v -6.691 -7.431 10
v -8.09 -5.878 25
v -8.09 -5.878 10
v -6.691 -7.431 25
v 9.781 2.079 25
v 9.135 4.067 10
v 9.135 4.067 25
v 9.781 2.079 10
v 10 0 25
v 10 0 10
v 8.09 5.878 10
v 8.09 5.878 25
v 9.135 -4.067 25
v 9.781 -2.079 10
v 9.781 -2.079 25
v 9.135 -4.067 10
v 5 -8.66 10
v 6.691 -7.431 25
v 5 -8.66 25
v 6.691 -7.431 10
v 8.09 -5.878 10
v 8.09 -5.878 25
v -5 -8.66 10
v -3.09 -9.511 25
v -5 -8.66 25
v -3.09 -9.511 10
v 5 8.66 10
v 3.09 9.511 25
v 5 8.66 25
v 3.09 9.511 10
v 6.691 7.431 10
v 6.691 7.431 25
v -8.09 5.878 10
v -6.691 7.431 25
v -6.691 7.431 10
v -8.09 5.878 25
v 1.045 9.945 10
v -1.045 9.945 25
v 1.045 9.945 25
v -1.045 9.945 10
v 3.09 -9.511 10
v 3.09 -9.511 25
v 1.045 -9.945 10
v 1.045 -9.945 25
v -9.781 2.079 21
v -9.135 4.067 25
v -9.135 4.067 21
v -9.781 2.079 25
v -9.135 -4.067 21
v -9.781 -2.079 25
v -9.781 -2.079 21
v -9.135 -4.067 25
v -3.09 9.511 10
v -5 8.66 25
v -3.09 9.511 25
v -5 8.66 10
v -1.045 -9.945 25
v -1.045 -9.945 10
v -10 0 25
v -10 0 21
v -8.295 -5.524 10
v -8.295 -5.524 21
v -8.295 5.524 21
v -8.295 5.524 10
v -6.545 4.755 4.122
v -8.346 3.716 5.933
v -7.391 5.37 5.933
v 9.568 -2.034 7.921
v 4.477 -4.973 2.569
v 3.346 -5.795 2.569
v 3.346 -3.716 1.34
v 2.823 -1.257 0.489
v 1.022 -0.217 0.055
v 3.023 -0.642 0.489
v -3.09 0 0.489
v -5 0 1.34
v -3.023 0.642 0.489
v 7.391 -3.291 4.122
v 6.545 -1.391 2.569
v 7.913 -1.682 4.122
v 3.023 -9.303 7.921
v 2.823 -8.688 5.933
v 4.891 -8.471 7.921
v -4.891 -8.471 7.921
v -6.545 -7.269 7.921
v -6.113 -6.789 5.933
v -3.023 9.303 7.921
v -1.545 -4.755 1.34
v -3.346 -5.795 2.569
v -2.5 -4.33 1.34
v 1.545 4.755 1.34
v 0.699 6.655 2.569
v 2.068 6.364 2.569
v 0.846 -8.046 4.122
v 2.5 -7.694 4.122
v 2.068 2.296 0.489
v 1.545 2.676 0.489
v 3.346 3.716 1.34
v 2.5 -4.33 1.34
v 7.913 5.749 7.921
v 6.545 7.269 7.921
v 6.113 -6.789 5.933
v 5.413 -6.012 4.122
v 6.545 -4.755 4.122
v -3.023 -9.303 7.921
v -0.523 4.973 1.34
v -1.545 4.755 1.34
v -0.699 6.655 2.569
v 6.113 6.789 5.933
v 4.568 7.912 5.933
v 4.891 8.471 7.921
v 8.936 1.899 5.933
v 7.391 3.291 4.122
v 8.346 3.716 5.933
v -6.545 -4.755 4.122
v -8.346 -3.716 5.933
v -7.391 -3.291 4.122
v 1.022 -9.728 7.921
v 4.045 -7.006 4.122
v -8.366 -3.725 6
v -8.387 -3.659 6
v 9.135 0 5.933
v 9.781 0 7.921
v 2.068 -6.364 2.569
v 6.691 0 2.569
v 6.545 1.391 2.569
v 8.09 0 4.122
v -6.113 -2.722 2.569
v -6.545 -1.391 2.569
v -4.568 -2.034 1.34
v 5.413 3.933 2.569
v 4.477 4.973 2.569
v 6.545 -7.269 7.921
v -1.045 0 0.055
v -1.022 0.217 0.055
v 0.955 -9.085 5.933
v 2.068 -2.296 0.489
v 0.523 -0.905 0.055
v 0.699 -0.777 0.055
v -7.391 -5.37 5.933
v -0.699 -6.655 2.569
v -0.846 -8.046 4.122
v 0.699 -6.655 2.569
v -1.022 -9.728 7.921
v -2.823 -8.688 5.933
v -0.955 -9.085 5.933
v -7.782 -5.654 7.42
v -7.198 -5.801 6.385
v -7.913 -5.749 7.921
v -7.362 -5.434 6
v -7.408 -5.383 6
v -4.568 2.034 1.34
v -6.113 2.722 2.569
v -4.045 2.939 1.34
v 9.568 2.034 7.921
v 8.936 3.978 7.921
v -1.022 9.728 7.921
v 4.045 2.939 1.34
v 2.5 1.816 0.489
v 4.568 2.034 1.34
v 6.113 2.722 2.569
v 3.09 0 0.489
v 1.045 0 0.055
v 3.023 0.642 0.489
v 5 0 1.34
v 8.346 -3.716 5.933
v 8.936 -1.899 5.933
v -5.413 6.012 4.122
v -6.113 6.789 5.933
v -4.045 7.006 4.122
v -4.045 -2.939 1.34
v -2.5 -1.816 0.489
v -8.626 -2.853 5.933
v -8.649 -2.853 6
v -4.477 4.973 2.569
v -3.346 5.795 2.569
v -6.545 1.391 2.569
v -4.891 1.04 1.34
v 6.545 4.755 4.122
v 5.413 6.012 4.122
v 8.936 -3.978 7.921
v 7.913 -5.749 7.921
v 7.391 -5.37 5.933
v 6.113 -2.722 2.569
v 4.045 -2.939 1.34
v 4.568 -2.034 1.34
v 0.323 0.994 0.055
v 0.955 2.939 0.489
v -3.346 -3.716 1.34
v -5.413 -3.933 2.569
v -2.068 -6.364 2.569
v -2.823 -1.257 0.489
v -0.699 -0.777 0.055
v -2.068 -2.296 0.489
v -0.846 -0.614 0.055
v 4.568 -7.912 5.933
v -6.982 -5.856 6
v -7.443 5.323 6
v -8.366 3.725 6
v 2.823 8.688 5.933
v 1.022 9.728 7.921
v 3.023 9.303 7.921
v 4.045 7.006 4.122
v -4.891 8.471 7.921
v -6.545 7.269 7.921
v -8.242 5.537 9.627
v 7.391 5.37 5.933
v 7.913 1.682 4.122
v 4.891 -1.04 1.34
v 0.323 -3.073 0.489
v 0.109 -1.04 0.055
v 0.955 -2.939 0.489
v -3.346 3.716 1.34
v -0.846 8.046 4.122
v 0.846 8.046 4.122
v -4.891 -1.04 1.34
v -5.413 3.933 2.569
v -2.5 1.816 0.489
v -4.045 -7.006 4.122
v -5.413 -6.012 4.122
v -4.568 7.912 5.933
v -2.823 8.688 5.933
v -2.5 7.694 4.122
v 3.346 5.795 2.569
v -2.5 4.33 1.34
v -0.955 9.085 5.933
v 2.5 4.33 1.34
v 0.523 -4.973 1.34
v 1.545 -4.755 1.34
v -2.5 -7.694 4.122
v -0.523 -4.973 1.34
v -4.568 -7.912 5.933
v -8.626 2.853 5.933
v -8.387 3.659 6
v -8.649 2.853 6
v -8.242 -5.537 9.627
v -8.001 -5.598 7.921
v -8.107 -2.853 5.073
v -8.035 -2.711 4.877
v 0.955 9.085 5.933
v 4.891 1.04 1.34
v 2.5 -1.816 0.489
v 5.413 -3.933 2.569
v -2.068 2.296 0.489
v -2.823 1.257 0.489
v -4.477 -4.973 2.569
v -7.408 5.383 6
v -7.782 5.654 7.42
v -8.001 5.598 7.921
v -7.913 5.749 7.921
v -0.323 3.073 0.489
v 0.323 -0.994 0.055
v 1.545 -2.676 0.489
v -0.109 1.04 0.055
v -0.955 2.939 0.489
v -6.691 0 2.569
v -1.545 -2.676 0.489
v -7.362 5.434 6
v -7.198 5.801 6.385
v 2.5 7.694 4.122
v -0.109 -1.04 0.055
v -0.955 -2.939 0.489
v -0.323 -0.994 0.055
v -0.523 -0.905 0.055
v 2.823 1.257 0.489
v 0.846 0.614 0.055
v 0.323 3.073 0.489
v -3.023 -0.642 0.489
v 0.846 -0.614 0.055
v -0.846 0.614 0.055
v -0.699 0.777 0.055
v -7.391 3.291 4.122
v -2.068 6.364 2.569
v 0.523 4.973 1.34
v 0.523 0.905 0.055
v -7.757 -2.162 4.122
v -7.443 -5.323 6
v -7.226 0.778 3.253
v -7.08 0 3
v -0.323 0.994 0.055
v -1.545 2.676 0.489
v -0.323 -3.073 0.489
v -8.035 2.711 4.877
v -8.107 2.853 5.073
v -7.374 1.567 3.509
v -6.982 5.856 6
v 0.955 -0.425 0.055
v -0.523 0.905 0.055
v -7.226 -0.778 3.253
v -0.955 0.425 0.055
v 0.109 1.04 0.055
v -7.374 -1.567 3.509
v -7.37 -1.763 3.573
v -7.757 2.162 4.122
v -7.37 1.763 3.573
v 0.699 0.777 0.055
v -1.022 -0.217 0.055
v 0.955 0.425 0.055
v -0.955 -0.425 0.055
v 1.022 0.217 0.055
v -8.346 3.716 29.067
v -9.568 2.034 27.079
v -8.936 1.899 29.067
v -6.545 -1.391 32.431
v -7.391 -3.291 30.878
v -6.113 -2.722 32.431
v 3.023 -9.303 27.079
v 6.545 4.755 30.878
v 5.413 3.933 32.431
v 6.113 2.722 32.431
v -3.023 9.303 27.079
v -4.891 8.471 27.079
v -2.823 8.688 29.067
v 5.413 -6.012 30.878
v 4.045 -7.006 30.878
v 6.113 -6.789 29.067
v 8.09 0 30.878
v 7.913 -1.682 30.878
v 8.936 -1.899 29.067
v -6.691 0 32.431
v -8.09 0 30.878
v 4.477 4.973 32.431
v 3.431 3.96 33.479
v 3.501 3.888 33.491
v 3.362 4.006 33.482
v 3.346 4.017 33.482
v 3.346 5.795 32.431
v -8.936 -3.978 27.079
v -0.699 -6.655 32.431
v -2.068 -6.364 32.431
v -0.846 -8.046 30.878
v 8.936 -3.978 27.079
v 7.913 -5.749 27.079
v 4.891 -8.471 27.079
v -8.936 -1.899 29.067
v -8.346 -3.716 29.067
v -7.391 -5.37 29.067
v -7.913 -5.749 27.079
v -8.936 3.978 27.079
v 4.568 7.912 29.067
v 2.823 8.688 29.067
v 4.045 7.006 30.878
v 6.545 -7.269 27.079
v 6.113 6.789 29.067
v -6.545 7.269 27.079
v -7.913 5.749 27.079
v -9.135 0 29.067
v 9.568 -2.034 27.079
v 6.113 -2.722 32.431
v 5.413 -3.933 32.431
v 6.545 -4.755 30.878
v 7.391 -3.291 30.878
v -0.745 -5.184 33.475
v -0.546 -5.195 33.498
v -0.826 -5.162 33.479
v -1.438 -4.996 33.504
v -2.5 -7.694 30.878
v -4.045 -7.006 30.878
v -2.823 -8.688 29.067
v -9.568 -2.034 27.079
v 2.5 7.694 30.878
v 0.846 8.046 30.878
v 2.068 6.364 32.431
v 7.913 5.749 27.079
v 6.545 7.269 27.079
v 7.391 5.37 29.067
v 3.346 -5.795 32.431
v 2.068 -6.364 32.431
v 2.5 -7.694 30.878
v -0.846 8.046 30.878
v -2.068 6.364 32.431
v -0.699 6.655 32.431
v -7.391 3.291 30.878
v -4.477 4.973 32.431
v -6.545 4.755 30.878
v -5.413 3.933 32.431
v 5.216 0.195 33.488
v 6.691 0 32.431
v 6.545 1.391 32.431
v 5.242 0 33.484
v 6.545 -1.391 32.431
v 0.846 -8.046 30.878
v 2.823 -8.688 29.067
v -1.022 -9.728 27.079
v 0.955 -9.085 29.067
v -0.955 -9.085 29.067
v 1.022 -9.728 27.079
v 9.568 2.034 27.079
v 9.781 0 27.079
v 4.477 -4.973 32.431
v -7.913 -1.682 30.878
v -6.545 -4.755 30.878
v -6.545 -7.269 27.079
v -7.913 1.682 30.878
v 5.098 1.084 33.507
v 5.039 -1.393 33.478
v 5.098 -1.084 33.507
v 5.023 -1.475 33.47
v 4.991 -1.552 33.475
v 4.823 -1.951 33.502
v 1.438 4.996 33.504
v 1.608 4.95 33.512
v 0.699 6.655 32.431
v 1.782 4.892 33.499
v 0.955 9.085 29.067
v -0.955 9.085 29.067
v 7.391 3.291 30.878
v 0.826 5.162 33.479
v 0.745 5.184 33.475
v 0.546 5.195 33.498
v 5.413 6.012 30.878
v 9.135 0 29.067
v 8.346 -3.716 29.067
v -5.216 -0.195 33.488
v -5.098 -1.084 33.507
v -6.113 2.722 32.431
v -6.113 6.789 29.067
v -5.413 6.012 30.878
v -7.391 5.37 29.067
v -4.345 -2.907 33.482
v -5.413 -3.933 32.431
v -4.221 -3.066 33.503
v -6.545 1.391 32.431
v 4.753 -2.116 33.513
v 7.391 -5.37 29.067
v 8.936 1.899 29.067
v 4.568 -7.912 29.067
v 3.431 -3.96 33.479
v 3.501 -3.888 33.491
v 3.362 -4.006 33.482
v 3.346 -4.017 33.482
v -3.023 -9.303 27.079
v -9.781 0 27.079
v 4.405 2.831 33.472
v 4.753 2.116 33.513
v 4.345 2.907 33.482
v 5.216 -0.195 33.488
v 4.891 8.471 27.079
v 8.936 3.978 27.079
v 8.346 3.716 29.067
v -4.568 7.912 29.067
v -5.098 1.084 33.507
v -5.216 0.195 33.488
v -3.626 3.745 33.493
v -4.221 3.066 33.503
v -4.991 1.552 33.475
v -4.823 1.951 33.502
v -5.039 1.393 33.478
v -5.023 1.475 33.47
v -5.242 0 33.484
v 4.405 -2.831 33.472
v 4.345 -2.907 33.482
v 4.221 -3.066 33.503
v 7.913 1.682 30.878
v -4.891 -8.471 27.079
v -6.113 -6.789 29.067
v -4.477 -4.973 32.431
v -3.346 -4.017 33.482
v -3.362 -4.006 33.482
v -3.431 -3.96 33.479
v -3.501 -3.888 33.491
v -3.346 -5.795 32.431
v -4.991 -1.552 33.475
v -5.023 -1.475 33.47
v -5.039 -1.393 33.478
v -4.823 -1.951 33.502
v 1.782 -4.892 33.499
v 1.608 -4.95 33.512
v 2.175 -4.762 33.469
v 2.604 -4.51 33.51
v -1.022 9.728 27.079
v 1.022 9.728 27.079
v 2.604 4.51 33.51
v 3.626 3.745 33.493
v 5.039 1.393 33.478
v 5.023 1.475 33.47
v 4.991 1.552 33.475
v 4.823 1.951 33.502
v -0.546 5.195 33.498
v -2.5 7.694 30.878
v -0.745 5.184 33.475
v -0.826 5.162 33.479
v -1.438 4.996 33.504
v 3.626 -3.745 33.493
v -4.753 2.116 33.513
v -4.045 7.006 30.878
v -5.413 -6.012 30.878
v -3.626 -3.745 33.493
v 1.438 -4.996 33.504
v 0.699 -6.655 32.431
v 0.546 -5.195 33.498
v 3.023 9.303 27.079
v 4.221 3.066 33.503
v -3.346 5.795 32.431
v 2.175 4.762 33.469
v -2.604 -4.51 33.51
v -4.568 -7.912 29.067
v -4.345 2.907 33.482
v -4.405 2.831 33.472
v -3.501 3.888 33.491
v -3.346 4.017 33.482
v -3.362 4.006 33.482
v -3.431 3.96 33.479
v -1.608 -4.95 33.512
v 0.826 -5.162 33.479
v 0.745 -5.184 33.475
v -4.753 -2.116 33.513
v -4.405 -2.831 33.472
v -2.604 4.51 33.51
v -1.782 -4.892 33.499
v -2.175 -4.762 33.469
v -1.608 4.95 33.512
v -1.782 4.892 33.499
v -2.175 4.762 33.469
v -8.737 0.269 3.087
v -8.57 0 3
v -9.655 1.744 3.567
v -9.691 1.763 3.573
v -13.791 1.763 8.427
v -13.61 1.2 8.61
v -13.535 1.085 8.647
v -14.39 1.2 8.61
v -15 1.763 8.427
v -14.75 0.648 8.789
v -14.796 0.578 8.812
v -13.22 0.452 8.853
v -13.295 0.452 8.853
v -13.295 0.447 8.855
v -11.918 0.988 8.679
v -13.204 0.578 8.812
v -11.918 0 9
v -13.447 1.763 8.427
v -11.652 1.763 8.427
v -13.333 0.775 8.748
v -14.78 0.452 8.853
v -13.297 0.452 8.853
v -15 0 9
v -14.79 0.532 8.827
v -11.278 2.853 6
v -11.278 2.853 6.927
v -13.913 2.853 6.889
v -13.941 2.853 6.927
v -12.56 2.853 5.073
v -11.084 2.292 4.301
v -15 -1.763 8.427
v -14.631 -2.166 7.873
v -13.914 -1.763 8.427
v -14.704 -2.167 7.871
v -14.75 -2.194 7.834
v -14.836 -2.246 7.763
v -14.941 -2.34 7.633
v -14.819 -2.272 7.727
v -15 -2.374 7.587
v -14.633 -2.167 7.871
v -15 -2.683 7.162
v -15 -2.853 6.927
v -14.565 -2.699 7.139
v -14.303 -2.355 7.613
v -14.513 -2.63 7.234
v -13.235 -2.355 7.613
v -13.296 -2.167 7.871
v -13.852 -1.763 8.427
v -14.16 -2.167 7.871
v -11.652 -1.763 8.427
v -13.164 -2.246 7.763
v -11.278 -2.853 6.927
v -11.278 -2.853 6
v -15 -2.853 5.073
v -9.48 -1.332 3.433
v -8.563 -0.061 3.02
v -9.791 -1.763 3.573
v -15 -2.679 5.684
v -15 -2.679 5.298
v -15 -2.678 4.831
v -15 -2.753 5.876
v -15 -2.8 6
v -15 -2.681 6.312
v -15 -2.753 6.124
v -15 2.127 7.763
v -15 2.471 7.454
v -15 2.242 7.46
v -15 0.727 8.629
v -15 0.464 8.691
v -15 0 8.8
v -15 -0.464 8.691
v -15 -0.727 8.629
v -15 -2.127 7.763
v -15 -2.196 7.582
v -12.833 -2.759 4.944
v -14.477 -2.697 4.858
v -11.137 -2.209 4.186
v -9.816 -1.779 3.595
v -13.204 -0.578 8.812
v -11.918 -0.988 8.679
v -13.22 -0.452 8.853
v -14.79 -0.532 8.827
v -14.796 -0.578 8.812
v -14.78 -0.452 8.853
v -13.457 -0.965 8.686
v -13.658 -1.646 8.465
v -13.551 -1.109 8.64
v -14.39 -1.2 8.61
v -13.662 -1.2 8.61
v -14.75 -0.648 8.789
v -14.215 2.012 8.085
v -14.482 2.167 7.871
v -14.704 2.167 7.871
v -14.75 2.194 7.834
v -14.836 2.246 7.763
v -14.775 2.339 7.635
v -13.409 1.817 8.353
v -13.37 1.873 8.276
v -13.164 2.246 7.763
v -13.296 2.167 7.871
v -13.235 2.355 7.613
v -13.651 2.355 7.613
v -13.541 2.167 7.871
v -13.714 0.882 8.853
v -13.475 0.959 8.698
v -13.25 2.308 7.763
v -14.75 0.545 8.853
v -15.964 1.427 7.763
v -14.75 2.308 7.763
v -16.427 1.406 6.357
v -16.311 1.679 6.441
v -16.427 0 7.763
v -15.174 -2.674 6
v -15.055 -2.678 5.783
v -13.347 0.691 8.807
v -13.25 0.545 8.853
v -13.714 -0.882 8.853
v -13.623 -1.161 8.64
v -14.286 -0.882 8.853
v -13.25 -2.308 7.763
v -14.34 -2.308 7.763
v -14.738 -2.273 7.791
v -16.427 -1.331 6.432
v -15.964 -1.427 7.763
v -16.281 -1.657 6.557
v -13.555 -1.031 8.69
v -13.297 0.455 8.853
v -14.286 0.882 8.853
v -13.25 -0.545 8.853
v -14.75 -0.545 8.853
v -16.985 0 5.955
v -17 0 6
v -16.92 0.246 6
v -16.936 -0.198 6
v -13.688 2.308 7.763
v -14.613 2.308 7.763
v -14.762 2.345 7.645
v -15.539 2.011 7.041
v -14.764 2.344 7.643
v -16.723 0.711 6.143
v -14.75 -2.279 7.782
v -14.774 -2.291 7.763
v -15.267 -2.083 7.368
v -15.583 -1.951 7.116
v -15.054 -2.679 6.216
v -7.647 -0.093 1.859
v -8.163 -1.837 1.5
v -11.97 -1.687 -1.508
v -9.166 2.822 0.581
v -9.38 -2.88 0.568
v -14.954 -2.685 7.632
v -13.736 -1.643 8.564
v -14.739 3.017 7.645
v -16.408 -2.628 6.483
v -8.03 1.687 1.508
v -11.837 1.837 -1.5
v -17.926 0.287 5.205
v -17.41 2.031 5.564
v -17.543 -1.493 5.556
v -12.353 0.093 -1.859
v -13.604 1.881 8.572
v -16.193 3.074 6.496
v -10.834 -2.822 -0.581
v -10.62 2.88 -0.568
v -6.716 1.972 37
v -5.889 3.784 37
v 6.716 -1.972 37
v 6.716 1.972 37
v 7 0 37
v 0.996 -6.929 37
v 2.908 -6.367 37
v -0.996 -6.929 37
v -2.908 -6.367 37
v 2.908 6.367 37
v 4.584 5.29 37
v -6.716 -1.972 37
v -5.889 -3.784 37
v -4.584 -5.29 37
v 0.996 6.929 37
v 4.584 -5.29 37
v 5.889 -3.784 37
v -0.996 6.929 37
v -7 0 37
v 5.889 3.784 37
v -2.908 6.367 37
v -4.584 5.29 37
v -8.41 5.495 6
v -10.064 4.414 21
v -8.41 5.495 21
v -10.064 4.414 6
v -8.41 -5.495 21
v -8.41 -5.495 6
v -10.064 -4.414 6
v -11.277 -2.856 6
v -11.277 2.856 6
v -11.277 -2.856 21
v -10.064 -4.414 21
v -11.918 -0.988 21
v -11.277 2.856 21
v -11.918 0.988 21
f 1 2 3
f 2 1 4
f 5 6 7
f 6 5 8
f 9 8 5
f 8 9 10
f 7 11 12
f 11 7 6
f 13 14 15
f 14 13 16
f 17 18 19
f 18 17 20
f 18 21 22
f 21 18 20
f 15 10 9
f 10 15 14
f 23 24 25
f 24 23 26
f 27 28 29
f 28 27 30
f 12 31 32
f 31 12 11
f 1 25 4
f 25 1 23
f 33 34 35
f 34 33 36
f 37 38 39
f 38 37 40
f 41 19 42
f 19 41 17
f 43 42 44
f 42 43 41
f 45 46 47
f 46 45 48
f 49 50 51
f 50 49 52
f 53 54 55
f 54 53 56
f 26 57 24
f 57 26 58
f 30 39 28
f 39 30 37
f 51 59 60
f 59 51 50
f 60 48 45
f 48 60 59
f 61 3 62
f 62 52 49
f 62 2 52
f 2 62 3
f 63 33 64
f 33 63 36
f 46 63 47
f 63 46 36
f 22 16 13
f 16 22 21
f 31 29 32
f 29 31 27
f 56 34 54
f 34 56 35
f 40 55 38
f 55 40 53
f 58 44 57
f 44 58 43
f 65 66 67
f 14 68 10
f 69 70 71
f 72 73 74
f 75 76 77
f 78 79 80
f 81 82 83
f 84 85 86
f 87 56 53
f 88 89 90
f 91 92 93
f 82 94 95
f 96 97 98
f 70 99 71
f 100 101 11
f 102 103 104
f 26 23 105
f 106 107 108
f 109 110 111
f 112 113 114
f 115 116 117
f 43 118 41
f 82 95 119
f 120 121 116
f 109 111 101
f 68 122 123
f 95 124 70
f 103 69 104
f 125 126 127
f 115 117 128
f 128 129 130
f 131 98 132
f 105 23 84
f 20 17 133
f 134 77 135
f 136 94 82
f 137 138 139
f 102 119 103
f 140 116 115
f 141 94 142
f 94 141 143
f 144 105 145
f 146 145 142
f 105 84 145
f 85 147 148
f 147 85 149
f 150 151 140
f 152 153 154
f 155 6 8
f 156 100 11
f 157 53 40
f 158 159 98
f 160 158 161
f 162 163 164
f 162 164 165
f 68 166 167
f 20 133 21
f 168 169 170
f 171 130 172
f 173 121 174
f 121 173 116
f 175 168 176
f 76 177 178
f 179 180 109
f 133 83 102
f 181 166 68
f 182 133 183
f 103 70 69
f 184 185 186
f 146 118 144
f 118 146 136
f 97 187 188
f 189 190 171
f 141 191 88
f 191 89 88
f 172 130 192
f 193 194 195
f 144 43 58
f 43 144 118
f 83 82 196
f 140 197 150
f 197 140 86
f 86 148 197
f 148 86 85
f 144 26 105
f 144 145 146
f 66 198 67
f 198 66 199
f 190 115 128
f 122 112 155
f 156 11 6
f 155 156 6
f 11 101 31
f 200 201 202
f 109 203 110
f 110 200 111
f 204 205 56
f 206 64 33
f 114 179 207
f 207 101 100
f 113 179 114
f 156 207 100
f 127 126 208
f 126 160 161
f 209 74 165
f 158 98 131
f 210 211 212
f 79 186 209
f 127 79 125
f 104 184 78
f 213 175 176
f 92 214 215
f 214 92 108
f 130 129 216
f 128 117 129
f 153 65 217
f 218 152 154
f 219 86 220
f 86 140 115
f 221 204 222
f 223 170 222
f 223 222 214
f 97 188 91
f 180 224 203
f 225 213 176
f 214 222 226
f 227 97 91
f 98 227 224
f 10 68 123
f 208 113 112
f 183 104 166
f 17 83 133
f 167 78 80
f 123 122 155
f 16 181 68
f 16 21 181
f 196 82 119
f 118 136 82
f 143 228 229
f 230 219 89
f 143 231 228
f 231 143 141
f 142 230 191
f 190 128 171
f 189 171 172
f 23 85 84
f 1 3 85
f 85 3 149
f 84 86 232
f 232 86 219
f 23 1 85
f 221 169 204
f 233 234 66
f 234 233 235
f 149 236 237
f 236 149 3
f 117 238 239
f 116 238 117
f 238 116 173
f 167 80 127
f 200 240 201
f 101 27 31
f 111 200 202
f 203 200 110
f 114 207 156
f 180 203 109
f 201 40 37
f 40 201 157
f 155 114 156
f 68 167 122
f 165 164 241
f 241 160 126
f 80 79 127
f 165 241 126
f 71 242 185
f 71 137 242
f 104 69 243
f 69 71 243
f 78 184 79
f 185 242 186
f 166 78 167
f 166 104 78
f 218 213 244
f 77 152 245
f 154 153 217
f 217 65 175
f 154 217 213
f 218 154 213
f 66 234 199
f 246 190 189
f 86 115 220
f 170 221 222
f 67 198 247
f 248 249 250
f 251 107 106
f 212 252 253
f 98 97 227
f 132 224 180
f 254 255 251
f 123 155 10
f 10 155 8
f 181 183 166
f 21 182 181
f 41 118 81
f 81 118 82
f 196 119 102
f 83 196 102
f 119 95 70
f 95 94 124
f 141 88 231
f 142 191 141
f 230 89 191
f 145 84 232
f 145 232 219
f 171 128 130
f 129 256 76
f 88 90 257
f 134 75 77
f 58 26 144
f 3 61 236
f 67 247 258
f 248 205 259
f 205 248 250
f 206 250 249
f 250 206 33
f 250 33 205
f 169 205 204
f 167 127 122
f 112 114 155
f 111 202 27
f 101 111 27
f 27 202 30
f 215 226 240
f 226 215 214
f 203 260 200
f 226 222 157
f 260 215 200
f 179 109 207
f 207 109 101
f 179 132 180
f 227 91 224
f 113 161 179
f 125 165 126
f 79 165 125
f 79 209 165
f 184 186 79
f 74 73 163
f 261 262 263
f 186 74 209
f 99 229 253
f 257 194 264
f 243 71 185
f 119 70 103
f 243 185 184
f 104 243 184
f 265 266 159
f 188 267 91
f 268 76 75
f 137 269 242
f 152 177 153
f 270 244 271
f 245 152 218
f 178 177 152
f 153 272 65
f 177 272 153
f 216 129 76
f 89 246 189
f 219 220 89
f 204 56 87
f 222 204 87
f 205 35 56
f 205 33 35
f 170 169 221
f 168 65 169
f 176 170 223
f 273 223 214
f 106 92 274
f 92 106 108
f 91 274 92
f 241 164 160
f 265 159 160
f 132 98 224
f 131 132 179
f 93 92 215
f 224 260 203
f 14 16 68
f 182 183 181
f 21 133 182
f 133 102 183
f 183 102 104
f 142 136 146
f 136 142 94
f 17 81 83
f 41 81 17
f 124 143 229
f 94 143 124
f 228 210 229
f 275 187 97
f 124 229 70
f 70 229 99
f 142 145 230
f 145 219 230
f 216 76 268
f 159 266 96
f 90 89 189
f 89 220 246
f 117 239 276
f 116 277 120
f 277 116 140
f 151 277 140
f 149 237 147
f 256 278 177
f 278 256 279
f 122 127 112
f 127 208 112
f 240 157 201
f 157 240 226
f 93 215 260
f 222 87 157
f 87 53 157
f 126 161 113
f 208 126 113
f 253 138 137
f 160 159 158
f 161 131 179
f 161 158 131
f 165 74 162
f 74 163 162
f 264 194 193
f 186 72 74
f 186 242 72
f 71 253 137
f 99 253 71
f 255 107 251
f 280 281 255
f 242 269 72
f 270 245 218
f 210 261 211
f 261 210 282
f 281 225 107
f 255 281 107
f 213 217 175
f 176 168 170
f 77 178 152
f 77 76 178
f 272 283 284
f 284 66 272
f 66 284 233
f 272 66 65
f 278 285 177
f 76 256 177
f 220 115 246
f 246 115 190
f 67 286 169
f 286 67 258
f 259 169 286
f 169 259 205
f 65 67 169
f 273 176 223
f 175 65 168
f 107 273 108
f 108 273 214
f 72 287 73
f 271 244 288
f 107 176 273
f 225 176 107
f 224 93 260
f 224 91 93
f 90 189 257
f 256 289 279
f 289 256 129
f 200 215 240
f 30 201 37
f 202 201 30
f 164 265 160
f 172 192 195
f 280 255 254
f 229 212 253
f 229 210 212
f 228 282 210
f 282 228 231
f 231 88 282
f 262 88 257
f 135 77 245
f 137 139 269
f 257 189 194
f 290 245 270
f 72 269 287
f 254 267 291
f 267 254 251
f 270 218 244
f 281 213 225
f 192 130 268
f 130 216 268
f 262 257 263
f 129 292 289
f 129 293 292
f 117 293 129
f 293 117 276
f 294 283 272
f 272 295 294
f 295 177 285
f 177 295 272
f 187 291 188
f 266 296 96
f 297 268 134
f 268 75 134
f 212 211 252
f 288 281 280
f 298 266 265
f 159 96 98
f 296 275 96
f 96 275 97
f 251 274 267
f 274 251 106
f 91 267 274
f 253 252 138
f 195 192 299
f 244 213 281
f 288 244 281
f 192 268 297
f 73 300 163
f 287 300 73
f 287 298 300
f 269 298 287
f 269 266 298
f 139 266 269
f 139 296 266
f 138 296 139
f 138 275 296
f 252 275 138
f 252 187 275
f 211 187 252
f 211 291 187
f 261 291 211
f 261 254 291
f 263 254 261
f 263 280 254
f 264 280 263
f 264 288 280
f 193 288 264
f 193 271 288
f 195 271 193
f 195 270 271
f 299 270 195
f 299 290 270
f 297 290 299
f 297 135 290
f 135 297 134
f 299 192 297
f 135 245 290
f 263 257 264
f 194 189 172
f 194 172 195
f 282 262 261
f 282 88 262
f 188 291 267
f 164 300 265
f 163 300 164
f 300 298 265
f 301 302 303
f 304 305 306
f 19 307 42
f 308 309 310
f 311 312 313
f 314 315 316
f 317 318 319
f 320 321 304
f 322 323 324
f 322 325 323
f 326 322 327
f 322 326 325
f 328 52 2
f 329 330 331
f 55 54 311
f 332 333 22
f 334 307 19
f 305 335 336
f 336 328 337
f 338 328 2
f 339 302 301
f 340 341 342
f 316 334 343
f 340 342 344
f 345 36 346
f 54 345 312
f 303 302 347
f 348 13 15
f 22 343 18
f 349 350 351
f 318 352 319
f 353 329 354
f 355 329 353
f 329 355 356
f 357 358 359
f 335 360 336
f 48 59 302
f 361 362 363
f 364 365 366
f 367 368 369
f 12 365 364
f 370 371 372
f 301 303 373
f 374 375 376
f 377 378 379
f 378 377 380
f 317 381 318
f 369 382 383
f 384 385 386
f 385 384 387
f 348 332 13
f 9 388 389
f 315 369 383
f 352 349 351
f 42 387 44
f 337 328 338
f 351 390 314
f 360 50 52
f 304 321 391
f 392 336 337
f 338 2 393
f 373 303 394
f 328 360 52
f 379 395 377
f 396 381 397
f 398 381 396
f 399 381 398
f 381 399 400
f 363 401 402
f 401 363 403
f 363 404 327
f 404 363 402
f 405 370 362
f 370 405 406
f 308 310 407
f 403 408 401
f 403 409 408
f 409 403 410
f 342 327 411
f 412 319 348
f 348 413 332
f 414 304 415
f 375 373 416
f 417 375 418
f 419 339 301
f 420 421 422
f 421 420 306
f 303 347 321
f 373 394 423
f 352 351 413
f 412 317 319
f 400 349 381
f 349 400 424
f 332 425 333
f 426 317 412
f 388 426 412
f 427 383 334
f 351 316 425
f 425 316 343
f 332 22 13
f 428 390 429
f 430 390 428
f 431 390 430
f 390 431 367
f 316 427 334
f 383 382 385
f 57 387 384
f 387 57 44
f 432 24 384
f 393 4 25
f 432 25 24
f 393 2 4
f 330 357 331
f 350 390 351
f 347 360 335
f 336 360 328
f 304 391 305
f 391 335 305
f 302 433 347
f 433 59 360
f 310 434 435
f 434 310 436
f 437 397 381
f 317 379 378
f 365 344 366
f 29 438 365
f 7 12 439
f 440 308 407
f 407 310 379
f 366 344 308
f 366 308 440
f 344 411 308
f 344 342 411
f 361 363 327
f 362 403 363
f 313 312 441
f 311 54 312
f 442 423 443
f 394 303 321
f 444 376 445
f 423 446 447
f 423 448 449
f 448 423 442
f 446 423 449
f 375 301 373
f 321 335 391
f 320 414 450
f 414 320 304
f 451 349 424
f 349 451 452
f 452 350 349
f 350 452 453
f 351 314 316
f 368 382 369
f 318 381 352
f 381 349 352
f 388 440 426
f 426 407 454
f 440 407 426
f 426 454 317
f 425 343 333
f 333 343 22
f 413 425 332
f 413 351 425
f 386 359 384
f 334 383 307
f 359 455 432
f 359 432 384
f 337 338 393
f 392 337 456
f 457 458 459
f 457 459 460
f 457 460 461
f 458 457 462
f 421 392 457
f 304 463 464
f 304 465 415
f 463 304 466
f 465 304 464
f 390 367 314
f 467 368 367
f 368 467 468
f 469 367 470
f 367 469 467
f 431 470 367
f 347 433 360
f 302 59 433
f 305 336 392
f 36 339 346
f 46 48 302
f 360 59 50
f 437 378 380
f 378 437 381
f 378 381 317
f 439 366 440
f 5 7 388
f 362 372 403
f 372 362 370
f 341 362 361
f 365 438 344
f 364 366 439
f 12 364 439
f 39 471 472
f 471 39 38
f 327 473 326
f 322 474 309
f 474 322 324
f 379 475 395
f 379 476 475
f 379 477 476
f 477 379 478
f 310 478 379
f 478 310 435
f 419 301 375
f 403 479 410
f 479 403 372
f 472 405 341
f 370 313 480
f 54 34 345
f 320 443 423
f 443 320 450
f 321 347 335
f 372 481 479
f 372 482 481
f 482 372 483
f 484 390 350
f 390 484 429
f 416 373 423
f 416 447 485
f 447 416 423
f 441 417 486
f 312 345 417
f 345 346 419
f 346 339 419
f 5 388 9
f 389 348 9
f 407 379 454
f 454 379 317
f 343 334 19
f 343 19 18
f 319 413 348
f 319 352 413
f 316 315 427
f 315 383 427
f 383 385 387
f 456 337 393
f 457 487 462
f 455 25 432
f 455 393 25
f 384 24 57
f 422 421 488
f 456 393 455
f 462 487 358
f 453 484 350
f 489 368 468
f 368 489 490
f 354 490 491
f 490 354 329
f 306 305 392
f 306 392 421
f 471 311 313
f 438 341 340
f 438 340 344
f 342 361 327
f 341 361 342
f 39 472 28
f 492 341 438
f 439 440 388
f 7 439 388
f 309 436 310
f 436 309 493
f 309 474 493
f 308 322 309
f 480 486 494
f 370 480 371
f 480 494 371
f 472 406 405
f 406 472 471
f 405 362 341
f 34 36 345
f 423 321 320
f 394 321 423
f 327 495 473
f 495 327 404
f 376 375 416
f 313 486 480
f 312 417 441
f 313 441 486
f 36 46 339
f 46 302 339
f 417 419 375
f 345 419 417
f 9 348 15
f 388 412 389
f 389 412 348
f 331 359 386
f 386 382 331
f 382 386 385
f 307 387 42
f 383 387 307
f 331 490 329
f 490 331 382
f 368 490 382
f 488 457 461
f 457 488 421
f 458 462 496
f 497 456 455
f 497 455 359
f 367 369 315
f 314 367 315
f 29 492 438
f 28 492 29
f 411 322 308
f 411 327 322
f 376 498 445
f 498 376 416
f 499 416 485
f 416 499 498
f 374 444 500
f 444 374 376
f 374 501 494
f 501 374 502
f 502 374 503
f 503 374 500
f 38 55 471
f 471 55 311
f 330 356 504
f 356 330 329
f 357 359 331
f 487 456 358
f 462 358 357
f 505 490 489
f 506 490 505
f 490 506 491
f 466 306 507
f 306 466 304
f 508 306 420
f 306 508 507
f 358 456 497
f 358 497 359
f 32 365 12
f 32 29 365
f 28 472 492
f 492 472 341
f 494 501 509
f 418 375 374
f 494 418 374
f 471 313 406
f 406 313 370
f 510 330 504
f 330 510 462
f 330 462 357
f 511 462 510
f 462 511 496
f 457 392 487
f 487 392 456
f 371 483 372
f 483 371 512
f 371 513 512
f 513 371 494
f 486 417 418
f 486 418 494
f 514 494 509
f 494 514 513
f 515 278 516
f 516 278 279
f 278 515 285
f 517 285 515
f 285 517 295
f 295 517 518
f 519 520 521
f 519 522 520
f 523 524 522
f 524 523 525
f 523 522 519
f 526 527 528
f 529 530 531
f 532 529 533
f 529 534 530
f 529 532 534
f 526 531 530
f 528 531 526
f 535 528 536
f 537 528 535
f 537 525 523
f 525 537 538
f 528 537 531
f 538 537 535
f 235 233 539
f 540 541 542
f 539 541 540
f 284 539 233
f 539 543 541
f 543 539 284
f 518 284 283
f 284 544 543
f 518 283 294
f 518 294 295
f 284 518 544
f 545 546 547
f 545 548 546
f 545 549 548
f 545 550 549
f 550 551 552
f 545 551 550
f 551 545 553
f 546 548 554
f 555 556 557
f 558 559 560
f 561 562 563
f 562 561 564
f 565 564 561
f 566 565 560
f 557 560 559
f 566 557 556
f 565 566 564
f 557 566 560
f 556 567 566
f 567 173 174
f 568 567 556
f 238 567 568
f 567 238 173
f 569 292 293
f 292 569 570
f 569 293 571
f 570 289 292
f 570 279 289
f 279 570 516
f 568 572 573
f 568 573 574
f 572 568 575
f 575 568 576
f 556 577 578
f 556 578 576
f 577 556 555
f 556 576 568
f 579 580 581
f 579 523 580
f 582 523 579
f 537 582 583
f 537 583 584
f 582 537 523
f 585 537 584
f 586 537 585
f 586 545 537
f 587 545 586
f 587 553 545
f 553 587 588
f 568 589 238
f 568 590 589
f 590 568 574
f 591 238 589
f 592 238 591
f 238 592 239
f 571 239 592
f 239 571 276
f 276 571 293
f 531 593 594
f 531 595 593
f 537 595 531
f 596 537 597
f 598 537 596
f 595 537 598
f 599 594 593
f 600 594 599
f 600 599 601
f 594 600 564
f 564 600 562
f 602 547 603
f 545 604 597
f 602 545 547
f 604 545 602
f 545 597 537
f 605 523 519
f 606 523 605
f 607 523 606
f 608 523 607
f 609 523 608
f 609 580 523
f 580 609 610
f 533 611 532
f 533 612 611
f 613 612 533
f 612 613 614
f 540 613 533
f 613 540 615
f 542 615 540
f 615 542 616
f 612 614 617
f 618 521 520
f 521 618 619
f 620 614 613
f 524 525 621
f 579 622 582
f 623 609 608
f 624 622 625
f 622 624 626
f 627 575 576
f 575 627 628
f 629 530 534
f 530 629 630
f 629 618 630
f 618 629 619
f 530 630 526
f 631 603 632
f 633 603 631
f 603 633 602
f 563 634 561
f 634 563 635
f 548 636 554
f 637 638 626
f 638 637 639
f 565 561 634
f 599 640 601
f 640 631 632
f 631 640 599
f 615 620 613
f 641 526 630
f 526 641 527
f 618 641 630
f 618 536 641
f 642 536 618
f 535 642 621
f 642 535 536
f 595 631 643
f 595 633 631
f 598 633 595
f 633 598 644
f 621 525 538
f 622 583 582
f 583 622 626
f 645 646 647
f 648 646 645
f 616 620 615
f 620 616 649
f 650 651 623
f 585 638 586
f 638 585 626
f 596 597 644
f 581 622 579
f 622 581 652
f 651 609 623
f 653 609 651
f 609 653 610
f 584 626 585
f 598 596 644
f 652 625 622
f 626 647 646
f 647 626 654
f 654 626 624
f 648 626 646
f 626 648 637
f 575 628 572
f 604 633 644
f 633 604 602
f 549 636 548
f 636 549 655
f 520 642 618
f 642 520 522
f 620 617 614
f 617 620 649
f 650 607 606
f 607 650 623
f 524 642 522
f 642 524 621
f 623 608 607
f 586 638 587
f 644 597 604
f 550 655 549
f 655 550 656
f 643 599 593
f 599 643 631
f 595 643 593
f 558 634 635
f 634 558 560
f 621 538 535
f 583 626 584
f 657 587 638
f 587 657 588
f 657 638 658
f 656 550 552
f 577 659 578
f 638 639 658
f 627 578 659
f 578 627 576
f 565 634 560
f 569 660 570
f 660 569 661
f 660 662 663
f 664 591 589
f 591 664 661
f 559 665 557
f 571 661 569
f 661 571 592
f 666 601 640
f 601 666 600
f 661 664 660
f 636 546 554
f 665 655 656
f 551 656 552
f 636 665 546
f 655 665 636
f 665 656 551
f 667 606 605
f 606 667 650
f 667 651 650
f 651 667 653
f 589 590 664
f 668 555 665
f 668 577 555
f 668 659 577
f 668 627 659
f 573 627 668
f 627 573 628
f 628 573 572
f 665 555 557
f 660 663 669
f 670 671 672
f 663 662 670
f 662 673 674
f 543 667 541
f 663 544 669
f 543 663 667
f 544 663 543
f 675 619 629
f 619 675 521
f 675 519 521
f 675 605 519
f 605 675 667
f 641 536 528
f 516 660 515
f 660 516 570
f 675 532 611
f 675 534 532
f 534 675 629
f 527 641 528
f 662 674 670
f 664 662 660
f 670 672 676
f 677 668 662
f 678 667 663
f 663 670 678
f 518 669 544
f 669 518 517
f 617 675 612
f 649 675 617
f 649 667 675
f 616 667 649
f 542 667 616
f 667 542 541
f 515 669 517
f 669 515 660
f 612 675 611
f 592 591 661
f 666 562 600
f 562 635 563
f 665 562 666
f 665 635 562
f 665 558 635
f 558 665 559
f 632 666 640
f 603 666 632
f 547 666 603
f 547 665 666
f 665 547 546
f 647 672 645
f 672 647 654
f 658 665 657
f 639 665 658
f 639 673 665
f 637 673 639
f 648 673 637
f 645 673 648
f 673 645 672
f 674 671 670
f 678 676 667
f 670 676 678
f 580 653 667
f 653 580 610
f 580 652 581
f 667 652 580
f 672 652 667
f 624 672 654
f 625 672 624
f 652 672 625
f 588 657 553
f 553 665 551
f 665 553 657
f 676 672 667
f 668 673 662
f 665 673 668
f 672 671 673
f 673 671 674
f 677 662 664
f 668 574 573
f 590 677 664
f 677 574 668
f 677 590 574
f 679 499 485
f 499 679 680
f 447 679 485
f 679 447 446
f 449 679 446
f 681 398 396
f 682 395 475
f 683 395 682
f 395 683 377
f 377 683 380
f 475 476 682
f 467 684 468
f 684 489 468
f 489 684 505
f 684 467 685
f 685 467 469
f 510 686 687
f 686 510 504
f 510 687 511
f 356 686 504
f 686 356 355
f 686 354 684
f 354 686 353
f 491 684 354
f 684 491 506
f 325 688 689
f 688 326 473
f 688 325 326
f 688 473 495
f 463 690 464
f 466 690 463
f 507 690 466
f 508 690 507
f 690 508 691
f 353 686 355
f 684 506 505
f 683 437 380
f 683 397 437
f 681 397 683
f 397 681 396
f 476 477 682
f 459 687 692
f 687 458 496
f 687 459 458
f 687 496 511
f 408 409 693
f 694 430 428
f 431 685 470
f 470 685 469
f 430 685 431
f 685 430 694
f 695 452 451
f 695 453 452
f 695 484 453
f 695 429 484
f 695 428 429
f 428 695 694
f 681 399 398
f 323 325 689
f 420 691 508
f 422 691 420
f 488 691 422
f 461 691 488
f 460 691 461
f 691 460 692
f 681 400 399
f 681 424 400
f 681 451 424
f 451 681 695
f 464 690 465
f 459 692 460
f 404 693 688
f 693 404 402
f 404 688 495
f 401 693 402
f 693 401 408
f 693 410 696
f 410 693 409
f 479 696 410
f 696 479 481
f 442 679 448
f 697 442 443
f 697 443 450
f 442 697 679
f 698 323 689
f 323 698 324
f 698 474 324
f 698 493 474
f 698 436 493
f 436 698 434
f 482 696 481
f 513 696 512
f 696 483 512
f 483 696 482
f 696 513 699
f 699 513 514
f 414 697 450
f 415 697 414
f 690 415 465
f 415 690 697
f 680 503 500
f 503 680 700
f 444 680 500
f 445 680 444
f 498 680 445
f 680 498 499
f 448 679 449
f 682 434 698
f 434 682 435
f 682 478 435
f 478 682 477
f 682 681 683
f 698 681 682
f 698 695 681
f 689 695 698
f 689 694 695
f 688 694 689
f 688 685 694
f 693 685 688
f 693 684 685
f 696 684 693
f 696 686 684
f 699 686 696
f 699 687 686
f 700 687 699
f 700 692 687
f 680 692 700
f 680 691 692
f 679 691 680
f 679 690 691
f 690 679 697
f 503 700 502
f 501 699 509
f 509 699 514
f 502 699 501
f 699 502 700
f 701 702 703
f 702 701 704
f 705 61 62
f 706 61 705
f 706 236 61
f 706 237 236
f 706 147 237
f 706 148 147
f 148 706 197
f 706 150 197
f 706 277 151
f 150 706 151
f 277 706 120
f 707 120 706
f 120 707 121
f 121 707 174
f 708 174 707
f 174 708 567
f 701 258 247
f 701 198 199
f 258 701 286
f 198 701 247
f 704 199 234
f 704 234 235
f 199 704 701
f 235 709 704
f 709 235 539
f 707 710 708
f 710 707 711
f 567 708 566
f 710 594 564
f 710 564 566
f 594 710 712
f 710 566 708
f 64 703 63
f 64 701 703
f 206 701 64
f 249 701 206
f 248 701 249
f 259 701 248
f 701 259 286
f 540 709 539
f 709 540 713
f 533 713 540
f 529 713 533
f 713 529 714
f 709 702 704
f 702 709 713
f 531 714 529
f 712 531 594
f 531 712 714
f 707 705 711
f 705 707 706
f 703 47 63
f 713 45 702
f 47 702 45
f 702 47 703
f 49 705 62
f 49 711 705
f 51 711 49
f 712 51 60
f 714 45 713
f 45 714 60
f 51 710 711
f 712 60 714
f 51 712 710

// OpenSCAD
//корпус
translate([0,0,10])
cylinder(15,10,10);
translate([0,0,10])
sphere(10);
translate([-0,-0,25])
sphere(10);
//труба
translate([-6,-0,6])
rotate([-90,-90,90])
cylinder(9,3,3);
translate([-14,-0,6])
sphere(3);
//другая труба
translate([-10,0,-0])
rotate([25,-30,-45])
cylinder(9,3,3);
//хвост
translate([0,-0,25])
cylinder(12,1,7);
//второй корпус
translate([-6,-0,6])
cylinder(15,6,6);
